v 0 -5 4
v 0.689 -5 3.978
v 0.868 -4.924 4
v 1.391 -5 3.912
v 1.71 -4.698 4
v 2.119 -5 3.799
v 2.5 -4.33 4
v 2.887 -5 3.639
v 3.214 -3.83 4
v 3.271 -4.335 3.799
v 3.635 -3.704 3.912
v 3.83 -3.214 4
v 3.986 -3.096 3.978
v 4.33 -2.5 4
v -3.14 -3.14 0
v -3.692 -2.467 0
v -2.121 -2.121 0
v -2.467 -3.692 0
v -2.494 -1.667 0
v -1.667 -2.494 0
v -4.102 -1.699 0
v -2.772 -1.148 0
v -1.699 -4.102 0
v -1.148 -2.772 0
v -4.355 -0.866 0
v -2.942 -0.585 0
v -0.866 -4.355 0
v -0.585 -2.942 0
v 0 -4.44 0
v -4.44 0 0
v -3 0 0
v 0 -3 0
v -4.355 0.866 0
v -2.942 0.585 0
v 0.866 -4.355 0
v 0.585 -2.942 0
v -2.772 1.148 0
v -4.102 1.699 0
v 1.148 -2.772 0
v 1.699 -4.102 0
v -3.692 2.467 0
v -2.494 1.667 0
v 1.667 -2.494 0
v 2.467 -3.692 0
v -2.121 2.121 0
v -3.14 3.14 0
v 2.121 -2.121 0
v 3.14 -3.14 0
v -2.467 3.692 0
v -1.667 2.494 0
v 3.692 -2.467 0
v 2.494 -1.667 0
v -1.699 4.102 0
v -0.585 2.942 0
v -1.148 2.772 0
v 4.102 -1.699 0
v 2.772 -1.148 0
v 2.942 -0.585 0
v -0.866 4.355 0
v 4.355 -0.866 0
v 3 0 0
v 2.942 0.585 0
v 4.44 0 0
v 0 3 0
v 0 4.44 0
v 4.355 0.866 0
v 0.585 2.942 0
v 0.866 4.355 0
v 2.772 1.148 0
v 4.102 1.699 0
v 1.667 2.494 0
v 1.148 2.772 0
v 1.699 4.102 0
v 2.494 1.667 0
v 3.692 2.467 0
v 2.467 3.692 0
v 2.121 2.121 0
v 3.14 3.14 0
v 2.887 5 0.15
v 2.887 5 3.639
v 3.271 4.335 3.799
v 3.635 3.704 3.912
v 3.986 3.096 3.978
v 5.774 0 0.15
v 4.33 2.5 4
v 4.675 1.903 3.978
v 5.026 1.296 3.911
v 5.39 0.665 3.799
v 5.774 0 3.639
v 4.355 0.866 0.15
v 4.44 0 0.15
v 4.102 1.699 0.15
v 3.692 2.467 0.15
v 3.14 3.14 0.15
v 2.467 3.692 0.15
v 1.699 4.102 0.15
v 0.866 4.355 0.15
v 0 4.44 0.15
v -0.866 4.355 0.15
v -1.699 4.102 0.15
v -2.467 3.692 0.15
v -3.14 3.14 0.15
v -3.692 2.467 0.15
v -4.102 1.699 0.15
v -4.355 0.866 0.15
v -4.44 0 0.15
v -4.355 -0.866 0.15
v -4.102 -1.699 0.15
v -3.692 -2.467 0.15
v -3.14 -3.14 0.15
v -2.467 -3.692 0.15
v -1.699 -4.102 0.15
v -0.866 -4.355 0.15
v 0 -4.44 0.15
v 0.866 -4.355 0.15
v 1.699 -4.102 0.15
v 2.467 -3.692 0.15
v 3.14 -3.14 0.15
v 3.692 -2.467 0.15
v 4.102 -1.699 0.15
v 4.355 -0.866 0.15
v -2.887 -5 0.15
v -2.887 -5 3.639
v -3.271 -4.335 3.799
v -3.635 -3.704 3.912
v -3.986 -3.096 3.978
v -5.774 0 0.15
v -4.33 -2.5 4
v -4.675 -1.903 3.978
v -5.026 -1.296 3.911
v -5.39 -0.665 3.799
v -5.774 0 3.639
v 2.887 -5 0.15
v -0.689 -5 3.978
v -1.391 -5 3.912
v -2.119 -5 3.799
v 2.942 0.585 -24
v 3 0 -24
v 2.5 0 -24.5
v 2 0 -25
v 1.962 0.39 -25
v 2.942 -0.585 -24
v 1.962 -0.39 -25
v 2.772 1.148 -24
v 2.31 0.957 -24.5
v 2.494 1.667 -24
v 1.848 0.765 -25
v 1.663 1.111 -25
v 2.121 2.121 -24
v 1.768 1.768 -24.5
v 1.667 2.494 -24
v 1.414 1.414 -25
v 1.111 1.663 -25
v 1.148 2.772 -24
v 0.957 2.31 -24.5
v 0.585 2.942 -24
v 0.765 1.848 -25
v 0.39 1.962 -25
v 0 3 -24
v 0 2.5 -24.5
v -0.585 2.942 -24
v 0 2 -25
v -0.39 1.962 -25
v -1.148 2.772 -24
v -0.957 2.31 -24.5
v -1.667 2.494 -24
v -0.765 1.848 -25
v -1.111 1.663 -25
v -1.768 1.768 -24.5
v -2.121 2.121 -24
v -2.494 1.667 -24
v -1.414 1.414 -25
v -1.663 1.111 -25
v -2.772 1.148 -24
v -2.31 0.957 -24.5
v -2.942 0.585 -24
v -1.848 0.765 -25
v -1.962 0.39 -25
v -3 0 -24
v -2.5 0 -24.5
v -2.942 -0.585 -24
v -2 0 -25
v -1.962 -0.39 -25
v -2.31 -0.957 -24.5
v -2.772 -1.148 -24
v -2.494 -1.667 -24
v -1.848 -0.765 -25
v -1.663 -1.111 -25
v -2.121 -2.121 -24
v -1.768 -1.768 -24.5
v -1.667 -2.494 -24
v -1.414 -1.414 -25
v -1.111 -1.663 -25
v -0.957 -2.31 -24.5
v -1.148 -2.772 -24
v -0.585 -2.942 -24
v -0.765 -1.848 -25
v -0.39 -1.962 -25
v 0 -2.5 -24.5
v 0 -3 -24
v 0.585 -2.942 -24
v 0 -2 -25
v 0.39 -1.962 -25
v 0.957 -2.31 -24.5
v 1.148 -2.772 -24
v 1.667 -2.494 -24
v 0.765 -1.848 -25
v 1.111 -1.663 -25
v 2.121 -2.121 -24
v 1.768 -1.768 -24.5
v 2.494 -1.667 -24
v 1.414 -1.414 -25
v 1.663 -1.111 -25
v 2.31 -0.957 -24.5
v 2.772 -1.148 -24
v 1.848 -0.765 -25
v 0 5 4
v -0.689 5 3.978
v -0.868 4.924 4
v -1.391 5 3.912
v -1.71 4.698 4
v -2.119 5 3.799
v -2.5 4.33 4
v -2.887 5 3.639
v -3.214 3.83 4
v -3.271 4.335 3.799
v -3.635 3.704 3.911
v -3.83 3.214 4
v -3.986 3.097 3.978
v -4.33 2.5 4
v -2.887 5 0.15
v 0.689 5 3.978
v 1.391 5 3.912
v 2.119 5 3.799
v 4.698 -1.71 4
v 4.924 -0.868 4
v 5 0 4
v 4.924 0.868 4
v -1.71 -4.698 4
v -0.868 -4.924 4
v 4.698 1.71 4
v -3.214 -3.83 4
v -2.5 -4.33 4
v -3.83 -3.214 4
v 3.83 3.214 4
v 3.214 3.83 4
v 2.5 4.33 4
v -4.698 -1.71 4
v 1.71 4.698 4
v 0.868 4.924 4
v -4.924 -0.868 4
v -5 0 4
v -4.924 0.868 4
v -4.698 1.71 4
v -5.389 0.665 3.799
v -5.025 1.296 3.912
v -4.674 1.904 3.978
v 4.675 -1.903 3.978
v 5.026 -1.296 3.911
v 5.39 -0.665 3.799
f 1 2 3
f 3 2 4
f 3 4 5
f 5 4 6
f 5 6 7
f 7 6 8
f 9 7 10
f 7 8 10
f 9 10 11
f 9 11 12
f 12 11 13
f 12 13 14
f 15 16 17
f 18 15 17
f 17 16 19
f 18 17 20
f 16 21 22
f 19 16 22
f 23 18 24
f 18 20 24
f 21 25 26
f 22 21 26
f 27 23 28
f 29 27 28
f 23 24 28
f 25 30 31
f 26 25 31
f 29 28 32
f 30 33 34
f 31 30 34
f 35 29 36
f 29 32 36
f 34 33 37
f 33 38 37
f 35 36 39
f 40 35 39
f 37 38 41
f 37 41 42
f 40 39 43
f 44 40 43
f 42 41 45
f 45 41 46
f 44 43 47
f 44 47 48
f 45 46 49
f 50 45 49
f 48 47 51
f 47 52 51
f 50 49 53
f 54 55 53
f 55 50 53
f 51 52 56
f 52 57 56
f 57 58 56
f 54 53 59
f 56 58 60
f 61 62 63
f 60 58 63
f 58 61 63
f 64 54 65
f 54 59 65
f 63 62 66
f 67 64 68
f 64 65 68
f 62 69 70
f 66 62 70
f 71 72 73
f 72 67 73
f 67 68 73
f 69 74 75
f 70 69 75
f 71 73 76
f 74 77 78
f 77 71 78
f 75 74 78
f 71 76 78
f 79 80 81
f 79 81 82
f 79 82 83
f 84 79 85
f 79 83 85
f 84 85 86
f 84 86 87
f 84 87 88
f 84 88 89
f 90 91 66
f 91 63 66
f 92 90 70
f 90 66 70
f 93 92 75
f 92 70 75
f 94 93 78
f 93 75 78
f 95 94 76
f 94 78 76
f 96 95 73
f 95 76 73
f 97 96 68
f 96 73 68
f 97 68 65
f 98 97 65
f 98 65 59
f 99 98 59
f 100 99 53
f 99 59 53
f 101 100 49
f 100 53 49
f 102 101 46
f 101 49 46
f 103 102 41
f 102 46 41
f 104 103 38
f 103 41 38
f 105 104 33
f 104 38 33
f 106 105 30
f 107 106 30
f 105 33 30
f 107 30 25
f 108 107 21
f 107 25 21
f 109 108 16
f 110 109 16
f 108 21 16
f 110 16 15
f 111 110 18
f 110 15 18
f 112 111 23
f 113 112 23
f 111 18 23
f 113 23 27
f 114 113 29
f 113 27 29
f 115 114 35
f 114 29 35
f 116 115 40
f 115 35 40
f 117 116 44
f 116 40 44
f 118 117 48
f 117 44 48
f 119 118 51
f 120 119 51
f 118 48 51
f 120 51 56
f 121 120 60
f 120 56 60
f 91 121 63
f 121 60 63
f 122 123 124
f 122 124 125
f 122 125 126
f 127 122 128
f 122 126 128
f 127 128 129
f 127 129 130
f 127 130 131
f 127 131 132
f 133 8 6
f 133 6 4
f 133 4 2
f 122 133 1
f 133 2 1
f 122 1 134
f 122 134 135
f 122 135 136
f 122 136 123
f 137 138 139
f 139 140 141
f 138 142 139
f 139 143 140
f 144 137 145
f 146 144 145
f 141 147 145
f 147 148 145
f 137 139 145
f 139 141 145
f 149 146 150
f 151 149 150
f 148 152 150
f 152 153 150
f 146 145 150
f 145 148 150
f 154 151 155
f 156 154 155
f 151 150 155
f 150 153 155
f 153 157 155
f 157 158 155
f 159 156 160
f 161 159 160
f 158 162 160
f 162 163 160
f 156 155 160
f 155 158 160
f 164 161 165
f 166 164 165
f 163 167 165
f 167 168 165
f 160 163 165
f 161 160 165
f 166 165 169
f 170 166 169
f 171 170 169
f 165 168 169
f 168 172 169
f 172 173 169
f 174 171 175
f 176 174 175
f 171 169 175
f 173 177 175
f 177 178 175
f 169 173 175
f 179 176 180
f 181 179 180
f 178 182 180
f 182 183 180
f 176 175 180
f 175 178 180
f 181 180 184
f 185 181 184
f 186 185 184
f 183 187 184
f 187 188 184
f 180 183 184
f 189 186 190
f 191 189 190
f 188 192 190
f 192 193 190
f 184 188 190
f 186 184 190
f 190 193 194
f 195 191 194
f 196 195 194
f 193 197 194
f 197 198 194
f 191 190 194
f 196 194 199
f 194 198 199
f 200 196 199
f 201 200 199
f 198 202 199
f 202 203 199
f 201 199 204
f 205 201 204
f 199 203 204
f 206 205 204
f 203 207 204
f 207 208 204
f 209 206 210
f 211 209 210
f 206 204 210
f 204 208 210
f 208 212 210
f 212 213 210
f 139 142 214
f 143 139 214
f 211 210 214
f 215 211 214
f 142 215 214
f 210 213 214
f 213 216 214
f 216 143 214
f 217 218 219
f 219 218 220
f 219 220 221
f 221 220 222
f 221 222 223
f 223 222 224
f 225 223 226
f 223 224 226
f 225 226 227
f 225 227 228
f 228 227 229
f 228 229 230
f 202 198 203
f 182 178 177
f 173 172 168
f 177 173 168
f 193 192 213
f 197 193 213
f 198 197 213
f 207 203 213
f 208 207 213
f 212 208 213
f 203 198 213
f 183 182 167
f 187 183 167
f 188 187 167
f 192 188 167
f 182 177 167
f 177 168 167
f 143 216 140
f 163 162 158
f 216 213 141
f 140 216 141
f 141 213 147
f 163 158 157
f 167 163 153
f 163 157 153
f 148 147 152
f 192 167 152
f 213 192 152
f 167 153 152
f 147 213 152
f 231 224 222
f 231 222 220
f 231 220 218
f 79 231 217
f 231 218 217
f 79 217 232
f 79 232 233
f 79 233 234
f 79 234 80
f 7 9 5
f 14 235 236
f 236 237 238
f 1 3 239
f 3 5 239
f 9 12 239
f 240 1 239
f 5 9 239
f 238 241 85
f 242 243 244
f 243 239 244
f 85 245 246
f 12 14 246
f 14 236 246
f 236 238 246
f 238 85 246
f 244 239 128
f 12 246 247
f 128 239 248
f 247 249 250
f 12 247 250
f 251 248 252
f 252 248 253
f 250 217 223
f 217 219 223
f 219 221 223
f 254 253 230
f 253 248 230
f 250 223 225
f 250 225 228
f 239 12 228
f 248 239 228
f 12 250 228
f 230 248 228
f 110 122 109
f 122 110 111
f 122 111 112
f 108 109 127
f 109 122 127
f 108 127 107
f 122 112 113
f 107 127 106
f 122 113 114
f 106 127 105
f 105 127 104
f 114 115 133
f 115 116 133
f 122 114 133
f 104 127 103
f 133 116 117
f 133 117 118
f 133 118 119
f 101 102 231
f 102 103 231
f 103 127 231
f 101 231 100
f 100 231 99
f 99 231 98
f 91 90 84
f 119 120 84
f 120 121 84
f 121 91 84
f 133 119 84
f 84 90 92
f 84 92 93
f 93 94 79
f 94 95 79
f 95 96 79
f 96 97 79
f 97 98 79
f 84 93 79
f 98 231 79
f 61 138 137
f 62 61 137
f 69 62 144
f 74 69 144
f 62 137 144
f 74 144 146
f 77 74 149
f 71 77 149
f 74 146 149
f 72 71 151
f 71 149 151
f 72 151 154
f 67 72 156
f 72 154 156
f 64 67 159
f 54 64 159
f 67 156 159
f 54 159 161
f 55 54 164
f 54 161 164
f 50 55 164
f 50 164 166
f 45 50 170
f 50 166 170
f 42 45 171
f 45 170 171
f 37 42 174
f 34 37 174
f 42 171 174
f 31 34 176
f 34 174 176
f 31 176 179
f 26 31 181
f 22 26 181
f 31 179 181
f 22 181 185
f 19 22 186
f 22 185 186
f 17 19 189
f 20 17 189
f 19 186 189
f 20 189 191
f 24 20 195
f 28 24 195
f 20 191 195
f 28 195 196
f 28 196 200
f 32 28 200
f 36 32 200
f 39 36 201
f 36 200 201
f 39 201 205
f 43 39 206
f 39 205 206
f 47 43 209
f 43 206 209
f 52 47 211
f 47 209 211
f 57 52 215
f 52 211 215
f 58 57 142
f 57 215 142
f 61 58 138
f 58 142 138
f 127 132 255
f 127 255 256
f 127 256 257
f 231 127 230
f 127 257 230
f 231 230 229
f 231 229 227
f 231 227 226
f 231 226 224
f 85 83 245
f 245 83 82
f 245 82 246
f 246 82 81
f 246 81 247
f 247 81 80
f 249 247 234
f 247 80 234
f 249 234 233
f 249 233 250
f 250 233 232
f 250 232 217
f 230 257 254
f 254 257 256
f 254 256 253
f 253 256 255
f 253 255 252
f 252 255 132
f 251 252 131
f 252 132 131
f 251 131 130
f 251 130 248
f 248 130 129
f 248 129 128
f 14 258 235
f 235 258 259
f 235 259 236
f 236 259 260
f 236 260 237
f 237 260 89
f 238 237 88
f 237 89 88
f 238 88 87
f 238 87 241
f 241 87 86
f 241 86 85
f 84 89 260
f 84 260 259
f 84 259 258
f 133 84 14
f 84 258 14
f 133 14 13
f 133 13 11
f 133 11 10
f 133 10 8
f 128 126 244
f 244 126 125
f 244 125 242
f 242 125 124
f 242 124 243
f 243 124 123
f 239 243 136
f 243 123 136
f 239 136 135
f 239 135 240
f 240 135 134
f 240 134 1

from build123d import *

# Parameters (mm, degrees)
SKETCH001_R  = 7.773503
POCKET_DEPTH = 29.001
CHAMFER_SIZE = 1


with BuildPart() as part:
    # Sketch → Revolution (revolve)
    with BuildSketch(Plane.XZ):
        Polygon((0, 4), (5, 4), (6, 3.533692), (6, 0.15), (4.44, 0.15), (4.44, 0), (3, 0), (3, -25), (0, -25), align=None)
    revolve(axis=Axis((0, 0, 0), (0, 0, 1)))

    # Sketch001 → Pocket (cut, through all)
    with BuildSketch(Plane(origin=(0, 0, 4), x_dir=(-1, 0, 0), z_dir=(0, 0, 1))):
        Circle(SKETCH001_R)
        Polygon((-2.886751, 5), (2.886751, 5), (5.773503, 0), (2.886751, -5), (-2.886751, -5), (-5.773503, 0), align=None, mode=Mode.SUBTRACT)
    extrude(amount=-POCKET_DEPTH, mode=Mode.SUBTRACT)

    # Chamfer
    chamfer_edges = [part.edges().sort_by_distance(p)[0] for p in [
        (-3, 0, -25),
    ]]
    chamfer(chamfer_edges, length=CHAMFER_SIZE)


solid = part.part
